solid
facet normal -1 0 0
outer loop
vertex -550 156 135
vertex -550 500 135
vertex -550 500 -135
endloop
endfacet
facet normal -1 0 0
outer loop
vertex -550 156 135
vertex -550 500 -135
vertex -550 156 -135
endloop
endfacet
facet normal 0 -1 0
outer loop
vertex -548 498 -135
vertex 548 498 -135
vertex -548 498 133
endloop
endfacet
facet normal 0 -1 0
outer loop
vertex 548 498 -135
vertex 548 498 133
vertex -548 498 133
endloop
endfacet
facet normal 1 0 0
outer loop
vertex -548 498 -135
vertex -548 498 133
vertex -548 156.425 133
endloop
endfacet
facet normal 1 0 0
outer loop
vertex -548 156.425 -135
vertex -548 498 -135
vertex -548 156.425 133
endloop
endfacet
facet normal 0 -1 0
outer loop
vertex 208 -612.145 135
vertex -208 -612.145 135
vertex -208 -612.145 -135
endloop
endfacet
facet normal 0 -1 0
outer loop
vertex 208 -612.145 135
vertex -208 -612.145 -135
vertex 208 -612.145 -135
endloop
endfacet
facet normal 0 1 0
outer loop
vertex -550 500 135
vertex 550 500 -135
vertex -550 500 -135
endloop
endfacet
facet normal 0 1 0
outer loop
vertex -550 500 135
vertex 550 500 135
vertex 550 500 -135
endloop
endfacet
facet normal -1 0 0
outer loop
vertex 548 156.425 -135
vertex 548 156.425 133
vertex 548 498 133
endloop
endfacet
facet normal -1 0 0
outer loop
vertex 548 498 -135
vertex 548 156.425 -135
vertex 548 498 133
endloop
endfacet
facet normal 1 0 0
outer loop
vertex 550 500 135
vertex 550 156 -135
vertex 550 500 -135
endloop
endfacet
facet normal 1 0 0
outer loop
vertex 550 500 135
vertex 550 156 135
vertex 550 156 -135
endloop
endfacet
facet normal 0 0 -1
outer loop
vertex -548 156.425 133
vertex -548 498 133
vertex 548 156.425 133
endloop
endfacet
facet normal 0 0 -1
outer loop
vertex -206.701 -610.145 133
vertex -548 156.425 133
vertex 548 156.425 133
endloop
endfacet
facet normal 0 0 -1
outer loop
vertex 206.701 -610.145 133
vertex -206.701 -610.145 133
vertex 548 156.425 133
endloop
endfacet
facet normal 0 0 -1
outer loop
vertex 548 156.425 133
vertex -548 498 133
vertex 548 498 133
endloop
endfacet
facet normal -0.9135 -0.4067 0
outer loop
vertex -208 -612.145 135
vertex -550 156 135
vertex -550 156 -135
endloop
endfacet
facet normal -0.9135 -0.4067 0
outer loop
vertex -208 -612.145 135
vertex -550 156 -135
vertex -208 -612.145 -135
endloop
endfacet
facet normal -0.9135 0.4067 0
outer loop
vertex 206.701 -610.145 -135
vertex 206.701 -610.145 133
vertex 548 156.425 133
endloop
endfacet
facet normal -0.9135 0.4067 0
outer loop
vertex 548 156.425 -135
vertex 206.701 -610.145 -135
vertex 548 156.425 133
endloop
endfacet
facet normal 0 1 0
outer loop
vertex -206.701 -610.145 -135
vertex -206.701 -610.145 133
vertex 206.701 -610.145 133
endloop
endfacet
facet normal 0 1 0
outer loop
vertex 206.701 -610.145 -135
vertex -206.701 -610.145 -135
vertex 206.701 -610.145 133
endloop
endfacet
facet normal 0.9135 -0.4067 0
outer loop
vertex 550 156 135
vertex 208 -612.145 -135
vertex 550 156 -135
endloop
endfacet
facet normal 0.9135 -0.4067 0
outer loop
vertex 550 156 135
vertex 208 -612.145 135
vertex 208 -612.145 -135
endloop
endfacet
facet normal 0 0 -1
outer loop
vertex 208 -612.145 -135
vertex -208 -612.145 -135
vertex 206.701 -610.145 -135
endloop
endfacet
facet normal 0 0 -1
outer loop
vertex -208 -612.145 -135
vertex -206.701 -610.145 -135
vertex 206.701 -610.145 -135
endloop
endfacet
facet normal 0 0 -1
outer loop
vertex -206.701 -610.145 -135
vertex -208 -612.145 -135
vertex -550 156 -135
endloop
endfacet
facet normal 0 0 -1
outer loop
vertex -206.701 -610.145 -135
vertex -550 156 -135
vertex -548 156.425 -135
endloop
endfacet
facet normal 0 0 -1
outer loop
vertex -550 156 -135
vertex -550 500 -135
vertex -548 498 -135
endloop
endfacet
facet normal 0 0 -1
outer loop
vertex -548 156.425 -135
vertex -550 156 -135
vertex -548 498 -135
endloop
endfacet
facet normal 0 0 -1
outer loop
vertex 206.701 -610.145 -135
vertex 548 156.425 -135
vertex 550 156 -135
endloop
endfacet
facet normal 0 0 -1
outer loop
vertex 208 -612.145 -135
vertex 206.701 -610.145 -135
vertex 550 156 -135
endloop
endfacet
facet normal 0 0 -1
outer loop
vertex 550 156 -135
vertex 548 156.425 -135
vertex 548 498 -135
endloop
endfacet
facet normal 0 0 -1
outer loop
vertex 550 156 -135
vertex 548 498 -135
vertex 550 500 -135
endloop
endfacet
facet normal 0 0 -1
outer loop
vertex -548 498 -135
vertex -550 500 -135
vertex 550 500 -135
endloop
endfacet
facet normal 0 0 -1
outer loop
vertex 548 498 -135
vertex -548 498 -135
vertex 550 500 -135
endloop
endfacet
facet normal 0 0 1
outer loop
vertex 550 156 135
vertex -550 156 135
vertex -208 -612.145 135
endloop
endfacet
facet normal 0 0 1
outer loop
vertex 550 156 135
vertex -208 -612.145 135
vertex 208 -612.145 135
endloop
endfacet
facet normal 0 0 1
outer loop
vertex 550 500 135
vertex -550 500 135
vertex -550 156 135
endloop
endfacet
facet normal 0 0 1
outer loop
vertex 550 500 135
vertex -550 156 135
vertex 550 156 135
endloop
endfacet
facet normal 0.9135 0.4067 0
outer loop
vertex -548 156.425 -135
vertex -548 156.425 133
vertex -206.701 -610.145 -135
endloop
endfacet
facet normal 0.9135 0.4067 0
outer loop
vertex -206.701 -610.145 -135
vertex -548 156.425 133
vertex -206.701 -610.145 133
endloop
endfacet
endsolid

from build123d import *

# Parameters (mm, degrees)
BOSS_EXTRUDE1_DEPTH = 135
SHELL1_T            = -2


with BuildPart() as part:
    # Sketch1 → Boss-Extrude1 (new, symmetric)
    with BuildSketch(Plane.XY):
        Polygon((550, 500), (-550, 500), (-550, 156), (-208, -612.144576675), (208, -612.144576675), (550, 156), align=None)
    extrude(amount=BOSS_EXTRUDE1_DEPTH, both=True)

    # Shell1
    shell1_openings = [part.faces().sort_by_distance(p)[0] for p in [
        (0, 25.973898383, -135),
    ]]
    offset(amount=SHELL1_T, openings=shell1_openings, kind=Kind.INTERSECTION)


solid = part.part
